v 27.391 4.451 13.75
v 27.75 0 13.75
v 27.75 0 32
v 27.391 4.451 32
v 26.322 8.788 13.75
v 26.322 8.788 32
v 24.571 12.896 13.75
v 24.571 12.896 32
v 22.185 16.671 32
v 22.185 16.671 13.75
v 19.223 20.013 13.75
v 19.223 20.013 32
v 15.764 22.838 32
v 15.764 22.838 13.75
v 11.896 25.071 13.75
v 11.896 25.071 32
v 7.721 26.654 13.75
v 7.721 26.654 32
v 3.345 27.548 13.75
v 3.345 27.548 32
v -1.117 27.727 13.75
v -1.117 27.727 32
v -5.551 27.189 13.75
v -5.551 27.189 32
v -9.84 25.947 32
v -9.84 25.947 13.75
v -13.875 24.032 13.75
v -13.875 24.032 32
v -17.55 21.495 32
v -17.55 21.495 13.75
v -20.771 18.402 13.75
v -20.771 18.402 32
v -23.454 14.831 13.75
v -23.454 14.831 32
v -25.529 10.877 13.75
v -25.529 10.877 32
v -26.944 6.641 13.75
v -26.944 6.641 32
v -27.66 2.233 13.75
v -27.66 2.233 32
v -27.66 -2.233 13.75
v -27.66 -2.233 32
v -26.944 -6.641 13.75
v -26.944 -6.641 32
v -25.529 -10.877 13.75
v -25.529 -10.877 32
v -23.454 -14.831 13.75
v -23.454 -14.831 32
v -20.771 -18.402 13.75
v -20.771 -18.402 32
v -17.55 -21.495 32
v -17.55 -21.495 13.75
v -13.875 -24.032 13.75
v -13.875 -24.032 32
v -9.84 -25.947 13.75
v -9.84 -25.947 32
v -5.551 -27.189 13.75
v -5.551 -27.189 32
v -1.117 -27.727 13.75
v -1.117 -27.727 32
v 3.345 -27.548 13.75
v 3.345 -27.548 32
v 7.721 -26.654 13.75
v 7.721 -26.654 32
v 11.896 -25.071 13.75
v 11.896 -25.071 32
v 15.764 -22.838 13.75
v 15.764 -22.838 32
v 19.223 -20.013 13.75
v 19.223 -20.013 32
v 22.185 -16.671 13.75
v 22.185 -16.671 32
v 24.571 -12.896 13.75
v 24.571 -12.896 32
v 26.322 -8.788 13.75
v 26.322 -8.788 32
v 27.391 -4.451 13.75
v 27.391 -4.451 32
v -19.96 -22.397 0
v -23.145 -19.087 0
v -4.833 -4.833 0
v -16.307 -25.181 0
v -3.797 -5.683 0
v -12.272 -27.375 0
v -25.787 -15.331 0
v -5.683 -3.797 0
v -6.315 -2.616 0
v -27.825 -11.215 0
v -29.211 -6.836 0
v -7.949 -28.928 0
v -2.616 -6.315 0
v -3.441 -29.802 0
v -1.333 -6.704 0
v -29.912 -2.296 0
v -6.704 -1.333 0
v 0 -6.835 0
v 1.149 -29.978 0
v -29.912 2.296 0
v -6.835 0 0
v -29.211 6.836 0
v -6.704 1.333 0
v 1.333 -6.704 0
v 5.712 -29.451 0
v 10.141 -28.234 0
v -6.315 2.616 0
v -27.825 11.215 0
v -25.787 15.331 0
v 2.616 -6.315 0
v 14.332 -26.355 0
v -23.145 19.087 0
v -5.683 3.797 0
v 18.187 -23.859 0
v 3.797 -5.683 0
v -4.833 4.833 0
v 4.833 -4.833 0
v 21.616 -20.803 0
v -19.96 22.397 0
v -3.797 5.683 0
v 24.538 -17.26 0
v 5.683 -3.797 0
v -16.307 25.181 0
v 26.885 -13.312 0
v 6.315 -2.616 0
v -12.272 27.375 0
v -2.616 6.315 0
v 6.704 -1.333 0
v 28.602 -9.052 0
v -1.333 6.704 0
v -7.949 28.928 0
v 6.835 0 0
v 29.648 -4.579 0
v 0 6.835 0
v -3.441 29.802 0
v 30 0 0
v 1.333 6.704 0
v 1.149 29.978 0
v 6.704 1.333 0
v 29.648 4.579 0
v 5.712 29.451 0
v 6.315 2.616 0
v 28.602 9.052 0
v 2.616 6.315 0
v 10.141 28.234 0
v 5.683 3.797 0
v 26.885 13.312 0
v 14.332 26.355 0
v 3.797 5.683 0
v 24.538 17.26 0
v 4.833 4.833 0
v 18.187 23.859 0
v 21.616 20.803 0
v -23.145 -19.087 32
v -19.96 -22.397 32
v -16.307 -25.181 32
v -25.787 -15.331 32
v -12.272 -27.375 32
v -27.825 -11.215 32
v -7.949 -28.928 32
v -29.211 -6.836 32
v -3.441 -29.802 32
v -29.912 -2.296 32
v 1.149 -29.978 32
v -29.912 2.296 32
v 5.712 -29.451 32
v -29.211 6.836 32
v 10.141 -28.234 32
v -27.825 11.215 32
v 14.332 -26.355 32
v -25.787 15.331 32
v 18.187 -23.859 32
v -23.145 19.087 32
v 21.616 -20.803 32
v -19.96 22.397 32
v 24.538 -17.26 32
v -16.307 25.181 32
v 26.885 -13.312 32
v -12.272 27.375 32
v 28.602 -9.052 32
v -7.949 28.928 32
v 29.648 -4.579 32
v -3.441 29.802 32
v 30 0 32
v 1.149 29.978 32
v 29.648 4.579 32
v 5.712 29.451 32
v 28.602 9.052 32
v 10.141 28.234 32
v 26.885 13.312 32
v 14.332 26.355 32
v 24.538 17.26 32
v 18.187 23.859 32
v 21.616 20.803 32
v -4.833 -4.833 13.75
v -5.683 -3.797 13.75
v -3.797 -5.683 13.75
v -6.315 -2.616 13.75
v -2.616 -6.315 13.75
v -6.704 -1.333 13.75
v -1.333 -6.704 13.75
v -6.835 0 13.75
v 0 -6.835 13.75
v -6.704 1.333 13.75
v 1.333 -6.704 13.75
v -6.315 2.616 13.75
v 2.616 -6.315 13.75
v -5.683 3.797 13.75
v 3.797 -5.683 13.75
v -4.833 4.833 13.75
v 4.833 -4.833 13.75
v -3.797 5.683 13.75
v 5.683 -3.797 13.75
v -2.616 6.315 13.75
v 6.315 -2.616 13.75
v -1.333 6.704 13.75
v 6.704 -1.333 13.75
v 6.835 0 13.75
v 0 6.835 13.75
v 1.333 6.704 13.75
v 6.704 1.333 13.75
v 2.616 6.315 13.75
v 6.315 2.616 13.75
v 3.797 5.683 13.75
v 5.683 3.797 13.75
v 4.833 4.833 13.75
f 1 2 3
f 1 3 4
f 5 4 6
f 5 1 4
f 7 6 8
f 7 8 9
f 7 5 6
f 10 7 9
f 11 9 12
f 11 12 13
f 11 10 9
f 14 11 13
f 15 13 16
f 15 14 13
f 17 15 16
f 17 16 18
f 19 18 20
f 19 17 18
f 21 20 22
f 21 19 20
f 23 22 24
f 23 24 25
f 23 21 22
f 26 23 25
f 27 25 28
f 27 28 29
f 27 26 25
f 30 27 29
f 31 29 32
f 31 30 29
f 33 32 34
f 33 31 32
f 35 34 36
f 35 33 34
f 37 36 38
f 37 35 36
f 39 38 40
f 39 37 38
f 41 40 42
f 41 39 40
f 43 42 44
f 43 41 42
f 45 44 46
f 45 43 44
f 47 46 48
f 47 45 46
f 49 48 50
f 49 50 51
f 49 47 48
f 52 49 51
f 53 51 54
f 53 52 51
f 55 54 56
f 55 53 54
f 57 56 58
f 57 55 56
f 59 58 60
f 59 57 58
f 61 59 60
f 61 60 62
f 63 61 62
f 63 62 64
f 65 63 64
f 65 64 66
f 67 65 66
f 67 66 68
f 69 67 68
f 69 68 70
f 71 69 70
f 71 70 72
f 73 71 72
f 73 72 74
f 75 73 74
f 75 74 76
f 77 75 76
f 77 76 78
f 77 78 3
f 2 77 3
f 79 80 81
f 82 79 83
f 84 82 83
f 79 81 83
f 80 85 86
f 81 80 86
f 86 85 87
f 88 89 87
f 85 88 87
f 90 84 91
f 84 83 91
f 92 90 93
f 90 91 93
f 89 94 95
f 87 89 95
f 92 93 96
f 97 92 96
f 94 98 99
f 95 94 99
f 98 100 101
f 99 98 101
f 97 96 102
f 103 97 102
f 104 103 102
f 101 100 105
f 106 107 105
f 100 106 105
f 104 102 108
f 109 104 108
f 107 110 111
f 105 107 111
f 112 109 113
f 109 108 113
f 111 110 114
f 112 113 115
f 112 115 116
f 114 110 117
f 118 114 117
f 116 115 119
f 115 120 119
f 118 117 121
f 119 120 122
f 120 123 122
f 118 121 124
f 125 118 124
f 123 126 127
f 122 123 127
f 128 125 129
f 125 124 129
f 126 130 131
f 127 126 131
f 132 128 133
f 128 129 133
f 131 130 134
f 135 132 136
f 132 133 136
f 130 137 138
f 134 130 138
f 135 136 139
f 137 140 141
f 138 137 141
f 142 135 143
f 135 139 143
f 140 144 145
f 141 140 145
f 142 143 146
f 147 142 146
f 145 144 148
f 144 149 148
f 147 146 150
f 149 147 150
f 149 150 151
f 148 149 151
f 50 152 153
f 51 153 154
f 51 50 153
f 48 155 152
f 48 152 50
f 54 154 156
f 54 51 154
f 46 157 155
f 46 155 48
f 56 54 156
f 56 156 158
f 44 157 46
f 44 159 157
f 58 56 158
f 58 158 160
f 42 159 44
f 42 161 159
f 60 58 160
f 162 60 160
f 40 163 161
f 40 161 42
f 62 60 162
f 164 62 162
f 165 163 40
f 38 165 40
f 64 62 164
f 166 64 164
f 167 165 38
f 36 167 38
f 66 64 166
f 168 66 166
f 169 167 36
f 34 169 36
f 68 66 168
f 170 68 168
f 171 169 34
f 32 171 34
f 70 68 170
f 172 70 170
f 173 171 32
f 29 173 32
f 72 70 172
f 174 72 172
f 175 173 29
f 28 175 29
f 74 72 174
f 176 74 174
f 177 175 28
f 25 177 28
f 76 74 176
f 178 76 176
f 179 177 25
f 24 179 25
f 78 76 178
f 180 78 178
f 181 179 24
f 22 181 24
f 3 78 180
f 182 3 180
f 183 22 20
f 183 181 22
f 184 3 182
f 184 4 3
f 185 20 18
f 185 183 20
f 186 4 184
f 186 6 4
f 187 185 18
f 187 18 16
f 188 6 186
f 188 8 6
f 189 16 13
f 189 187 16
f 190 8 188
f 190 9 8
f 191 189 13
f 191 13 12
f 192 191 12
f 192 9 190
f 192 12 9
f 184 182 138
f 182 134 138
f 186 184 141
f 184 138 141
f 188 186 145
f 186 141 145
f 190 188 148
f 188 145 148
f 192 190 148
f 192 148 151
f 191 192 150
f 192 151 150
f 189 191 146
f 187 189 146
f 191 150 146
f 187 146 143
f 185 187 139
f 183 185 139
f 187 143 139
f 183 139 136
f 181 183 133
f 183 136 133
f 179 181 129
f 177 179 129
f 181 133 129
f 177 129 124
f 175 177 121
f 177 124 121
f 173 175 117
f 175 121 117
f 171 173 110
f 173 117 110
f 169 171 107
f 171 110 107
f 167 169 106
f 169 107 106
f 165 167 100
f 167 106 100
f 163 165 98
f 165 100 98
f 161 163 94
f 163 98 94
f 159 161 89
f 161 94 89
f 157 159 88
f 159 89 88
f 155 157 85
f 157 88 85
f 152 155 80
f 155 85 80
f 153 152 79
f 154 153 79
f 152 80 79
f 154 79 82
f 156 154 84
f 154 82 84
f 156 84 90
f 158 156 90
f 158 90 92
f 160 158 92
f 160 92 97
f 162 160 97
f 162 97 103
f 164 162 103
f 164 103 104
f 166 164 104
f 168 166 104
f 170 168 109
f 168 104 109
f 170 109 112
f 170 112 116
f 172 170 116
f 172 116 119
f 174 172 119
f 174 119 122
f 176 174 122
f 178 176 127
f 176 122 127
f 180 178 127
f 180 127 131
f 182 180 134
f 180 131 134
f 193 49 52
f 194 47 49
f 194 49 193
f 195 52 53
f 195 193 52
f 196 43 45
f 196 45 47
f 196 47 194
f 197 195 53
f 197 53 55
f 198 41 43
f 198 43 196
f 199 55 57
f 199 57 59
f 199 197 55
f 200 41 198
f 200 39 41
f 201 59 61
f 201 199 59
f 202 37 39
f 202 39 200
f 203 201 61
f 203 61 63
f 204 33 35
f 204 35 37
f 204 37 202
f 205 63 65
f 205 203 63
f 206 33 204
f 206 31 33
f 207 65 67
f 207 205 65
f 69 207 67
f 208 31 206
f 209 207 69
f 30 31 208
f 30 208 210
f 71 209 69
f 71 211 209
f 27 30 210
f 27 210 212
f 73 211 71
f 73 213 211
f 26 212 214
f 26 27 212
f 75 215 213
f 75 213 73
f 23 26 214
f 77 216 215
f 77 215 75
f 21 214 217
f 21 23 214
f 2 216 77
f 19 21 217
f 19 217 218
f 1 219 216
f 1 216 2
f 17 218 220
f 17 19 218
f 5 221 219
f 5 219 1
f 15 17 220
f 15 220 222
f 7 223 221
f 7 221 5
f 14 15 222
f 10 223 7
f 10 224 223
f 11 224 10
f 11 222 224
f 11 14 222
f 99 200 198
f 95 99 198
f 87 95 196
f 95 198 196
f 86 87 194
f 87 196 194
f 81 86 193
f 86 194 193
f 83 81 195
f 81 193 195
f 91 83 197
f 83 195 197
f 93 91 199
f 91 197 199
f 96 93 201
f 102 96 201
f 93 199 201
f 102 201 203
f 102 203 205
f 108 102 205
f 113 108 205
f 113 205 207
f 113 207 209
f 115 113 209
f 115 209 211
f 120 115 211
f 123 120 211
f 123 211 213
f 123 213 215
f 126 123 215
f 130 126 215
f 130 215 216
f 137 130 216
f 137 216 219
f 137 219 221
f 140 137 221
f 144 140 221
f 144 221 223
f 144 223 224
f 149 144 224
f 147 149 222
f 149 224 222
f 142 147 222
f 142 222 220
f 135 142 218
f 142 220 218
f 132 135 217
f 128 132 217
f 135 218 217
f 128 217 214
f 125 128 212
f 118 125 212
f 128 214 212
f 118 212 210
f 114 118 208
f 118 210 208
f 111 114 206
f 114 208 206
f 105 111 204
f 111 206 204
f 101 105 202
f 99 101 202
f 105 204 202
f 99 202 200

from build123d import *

# Parameters (mm, degrees)
F0_R     = 30
F1_DEPTH = 13.75
F2_R     = 30
F2_R_2   = 27.75
F3_DEPTH = 18.25
F5_D     = 13.67
F5_DEPTH = 13.75


with BuildPart() as f1:
    # F0 (on Top) → F1 (new body)
    with BuildSketch(Plane.XY):
        Circle(F0_R)
    extrude(amount=F1_DEPTH)

    # F2 (on face) → F3 (join)
    with BuildSketch(Plane.XY.offset(13.75)):
        Circle(F2_R)
        Circle(F2_R_2, mode=Mode.SUBTRACT)
    extrude(amount=F3_DEPTH)

    # F5
    with Locations(Plane(origin=(0, 0, 0), x_dir=(1, 0, 0), z_dir=(0, 0, -1))):
        with Locations((0, 0)):
            Hole(F5_D / 2, depth=F5_DEPTH)


solid = f1.part
